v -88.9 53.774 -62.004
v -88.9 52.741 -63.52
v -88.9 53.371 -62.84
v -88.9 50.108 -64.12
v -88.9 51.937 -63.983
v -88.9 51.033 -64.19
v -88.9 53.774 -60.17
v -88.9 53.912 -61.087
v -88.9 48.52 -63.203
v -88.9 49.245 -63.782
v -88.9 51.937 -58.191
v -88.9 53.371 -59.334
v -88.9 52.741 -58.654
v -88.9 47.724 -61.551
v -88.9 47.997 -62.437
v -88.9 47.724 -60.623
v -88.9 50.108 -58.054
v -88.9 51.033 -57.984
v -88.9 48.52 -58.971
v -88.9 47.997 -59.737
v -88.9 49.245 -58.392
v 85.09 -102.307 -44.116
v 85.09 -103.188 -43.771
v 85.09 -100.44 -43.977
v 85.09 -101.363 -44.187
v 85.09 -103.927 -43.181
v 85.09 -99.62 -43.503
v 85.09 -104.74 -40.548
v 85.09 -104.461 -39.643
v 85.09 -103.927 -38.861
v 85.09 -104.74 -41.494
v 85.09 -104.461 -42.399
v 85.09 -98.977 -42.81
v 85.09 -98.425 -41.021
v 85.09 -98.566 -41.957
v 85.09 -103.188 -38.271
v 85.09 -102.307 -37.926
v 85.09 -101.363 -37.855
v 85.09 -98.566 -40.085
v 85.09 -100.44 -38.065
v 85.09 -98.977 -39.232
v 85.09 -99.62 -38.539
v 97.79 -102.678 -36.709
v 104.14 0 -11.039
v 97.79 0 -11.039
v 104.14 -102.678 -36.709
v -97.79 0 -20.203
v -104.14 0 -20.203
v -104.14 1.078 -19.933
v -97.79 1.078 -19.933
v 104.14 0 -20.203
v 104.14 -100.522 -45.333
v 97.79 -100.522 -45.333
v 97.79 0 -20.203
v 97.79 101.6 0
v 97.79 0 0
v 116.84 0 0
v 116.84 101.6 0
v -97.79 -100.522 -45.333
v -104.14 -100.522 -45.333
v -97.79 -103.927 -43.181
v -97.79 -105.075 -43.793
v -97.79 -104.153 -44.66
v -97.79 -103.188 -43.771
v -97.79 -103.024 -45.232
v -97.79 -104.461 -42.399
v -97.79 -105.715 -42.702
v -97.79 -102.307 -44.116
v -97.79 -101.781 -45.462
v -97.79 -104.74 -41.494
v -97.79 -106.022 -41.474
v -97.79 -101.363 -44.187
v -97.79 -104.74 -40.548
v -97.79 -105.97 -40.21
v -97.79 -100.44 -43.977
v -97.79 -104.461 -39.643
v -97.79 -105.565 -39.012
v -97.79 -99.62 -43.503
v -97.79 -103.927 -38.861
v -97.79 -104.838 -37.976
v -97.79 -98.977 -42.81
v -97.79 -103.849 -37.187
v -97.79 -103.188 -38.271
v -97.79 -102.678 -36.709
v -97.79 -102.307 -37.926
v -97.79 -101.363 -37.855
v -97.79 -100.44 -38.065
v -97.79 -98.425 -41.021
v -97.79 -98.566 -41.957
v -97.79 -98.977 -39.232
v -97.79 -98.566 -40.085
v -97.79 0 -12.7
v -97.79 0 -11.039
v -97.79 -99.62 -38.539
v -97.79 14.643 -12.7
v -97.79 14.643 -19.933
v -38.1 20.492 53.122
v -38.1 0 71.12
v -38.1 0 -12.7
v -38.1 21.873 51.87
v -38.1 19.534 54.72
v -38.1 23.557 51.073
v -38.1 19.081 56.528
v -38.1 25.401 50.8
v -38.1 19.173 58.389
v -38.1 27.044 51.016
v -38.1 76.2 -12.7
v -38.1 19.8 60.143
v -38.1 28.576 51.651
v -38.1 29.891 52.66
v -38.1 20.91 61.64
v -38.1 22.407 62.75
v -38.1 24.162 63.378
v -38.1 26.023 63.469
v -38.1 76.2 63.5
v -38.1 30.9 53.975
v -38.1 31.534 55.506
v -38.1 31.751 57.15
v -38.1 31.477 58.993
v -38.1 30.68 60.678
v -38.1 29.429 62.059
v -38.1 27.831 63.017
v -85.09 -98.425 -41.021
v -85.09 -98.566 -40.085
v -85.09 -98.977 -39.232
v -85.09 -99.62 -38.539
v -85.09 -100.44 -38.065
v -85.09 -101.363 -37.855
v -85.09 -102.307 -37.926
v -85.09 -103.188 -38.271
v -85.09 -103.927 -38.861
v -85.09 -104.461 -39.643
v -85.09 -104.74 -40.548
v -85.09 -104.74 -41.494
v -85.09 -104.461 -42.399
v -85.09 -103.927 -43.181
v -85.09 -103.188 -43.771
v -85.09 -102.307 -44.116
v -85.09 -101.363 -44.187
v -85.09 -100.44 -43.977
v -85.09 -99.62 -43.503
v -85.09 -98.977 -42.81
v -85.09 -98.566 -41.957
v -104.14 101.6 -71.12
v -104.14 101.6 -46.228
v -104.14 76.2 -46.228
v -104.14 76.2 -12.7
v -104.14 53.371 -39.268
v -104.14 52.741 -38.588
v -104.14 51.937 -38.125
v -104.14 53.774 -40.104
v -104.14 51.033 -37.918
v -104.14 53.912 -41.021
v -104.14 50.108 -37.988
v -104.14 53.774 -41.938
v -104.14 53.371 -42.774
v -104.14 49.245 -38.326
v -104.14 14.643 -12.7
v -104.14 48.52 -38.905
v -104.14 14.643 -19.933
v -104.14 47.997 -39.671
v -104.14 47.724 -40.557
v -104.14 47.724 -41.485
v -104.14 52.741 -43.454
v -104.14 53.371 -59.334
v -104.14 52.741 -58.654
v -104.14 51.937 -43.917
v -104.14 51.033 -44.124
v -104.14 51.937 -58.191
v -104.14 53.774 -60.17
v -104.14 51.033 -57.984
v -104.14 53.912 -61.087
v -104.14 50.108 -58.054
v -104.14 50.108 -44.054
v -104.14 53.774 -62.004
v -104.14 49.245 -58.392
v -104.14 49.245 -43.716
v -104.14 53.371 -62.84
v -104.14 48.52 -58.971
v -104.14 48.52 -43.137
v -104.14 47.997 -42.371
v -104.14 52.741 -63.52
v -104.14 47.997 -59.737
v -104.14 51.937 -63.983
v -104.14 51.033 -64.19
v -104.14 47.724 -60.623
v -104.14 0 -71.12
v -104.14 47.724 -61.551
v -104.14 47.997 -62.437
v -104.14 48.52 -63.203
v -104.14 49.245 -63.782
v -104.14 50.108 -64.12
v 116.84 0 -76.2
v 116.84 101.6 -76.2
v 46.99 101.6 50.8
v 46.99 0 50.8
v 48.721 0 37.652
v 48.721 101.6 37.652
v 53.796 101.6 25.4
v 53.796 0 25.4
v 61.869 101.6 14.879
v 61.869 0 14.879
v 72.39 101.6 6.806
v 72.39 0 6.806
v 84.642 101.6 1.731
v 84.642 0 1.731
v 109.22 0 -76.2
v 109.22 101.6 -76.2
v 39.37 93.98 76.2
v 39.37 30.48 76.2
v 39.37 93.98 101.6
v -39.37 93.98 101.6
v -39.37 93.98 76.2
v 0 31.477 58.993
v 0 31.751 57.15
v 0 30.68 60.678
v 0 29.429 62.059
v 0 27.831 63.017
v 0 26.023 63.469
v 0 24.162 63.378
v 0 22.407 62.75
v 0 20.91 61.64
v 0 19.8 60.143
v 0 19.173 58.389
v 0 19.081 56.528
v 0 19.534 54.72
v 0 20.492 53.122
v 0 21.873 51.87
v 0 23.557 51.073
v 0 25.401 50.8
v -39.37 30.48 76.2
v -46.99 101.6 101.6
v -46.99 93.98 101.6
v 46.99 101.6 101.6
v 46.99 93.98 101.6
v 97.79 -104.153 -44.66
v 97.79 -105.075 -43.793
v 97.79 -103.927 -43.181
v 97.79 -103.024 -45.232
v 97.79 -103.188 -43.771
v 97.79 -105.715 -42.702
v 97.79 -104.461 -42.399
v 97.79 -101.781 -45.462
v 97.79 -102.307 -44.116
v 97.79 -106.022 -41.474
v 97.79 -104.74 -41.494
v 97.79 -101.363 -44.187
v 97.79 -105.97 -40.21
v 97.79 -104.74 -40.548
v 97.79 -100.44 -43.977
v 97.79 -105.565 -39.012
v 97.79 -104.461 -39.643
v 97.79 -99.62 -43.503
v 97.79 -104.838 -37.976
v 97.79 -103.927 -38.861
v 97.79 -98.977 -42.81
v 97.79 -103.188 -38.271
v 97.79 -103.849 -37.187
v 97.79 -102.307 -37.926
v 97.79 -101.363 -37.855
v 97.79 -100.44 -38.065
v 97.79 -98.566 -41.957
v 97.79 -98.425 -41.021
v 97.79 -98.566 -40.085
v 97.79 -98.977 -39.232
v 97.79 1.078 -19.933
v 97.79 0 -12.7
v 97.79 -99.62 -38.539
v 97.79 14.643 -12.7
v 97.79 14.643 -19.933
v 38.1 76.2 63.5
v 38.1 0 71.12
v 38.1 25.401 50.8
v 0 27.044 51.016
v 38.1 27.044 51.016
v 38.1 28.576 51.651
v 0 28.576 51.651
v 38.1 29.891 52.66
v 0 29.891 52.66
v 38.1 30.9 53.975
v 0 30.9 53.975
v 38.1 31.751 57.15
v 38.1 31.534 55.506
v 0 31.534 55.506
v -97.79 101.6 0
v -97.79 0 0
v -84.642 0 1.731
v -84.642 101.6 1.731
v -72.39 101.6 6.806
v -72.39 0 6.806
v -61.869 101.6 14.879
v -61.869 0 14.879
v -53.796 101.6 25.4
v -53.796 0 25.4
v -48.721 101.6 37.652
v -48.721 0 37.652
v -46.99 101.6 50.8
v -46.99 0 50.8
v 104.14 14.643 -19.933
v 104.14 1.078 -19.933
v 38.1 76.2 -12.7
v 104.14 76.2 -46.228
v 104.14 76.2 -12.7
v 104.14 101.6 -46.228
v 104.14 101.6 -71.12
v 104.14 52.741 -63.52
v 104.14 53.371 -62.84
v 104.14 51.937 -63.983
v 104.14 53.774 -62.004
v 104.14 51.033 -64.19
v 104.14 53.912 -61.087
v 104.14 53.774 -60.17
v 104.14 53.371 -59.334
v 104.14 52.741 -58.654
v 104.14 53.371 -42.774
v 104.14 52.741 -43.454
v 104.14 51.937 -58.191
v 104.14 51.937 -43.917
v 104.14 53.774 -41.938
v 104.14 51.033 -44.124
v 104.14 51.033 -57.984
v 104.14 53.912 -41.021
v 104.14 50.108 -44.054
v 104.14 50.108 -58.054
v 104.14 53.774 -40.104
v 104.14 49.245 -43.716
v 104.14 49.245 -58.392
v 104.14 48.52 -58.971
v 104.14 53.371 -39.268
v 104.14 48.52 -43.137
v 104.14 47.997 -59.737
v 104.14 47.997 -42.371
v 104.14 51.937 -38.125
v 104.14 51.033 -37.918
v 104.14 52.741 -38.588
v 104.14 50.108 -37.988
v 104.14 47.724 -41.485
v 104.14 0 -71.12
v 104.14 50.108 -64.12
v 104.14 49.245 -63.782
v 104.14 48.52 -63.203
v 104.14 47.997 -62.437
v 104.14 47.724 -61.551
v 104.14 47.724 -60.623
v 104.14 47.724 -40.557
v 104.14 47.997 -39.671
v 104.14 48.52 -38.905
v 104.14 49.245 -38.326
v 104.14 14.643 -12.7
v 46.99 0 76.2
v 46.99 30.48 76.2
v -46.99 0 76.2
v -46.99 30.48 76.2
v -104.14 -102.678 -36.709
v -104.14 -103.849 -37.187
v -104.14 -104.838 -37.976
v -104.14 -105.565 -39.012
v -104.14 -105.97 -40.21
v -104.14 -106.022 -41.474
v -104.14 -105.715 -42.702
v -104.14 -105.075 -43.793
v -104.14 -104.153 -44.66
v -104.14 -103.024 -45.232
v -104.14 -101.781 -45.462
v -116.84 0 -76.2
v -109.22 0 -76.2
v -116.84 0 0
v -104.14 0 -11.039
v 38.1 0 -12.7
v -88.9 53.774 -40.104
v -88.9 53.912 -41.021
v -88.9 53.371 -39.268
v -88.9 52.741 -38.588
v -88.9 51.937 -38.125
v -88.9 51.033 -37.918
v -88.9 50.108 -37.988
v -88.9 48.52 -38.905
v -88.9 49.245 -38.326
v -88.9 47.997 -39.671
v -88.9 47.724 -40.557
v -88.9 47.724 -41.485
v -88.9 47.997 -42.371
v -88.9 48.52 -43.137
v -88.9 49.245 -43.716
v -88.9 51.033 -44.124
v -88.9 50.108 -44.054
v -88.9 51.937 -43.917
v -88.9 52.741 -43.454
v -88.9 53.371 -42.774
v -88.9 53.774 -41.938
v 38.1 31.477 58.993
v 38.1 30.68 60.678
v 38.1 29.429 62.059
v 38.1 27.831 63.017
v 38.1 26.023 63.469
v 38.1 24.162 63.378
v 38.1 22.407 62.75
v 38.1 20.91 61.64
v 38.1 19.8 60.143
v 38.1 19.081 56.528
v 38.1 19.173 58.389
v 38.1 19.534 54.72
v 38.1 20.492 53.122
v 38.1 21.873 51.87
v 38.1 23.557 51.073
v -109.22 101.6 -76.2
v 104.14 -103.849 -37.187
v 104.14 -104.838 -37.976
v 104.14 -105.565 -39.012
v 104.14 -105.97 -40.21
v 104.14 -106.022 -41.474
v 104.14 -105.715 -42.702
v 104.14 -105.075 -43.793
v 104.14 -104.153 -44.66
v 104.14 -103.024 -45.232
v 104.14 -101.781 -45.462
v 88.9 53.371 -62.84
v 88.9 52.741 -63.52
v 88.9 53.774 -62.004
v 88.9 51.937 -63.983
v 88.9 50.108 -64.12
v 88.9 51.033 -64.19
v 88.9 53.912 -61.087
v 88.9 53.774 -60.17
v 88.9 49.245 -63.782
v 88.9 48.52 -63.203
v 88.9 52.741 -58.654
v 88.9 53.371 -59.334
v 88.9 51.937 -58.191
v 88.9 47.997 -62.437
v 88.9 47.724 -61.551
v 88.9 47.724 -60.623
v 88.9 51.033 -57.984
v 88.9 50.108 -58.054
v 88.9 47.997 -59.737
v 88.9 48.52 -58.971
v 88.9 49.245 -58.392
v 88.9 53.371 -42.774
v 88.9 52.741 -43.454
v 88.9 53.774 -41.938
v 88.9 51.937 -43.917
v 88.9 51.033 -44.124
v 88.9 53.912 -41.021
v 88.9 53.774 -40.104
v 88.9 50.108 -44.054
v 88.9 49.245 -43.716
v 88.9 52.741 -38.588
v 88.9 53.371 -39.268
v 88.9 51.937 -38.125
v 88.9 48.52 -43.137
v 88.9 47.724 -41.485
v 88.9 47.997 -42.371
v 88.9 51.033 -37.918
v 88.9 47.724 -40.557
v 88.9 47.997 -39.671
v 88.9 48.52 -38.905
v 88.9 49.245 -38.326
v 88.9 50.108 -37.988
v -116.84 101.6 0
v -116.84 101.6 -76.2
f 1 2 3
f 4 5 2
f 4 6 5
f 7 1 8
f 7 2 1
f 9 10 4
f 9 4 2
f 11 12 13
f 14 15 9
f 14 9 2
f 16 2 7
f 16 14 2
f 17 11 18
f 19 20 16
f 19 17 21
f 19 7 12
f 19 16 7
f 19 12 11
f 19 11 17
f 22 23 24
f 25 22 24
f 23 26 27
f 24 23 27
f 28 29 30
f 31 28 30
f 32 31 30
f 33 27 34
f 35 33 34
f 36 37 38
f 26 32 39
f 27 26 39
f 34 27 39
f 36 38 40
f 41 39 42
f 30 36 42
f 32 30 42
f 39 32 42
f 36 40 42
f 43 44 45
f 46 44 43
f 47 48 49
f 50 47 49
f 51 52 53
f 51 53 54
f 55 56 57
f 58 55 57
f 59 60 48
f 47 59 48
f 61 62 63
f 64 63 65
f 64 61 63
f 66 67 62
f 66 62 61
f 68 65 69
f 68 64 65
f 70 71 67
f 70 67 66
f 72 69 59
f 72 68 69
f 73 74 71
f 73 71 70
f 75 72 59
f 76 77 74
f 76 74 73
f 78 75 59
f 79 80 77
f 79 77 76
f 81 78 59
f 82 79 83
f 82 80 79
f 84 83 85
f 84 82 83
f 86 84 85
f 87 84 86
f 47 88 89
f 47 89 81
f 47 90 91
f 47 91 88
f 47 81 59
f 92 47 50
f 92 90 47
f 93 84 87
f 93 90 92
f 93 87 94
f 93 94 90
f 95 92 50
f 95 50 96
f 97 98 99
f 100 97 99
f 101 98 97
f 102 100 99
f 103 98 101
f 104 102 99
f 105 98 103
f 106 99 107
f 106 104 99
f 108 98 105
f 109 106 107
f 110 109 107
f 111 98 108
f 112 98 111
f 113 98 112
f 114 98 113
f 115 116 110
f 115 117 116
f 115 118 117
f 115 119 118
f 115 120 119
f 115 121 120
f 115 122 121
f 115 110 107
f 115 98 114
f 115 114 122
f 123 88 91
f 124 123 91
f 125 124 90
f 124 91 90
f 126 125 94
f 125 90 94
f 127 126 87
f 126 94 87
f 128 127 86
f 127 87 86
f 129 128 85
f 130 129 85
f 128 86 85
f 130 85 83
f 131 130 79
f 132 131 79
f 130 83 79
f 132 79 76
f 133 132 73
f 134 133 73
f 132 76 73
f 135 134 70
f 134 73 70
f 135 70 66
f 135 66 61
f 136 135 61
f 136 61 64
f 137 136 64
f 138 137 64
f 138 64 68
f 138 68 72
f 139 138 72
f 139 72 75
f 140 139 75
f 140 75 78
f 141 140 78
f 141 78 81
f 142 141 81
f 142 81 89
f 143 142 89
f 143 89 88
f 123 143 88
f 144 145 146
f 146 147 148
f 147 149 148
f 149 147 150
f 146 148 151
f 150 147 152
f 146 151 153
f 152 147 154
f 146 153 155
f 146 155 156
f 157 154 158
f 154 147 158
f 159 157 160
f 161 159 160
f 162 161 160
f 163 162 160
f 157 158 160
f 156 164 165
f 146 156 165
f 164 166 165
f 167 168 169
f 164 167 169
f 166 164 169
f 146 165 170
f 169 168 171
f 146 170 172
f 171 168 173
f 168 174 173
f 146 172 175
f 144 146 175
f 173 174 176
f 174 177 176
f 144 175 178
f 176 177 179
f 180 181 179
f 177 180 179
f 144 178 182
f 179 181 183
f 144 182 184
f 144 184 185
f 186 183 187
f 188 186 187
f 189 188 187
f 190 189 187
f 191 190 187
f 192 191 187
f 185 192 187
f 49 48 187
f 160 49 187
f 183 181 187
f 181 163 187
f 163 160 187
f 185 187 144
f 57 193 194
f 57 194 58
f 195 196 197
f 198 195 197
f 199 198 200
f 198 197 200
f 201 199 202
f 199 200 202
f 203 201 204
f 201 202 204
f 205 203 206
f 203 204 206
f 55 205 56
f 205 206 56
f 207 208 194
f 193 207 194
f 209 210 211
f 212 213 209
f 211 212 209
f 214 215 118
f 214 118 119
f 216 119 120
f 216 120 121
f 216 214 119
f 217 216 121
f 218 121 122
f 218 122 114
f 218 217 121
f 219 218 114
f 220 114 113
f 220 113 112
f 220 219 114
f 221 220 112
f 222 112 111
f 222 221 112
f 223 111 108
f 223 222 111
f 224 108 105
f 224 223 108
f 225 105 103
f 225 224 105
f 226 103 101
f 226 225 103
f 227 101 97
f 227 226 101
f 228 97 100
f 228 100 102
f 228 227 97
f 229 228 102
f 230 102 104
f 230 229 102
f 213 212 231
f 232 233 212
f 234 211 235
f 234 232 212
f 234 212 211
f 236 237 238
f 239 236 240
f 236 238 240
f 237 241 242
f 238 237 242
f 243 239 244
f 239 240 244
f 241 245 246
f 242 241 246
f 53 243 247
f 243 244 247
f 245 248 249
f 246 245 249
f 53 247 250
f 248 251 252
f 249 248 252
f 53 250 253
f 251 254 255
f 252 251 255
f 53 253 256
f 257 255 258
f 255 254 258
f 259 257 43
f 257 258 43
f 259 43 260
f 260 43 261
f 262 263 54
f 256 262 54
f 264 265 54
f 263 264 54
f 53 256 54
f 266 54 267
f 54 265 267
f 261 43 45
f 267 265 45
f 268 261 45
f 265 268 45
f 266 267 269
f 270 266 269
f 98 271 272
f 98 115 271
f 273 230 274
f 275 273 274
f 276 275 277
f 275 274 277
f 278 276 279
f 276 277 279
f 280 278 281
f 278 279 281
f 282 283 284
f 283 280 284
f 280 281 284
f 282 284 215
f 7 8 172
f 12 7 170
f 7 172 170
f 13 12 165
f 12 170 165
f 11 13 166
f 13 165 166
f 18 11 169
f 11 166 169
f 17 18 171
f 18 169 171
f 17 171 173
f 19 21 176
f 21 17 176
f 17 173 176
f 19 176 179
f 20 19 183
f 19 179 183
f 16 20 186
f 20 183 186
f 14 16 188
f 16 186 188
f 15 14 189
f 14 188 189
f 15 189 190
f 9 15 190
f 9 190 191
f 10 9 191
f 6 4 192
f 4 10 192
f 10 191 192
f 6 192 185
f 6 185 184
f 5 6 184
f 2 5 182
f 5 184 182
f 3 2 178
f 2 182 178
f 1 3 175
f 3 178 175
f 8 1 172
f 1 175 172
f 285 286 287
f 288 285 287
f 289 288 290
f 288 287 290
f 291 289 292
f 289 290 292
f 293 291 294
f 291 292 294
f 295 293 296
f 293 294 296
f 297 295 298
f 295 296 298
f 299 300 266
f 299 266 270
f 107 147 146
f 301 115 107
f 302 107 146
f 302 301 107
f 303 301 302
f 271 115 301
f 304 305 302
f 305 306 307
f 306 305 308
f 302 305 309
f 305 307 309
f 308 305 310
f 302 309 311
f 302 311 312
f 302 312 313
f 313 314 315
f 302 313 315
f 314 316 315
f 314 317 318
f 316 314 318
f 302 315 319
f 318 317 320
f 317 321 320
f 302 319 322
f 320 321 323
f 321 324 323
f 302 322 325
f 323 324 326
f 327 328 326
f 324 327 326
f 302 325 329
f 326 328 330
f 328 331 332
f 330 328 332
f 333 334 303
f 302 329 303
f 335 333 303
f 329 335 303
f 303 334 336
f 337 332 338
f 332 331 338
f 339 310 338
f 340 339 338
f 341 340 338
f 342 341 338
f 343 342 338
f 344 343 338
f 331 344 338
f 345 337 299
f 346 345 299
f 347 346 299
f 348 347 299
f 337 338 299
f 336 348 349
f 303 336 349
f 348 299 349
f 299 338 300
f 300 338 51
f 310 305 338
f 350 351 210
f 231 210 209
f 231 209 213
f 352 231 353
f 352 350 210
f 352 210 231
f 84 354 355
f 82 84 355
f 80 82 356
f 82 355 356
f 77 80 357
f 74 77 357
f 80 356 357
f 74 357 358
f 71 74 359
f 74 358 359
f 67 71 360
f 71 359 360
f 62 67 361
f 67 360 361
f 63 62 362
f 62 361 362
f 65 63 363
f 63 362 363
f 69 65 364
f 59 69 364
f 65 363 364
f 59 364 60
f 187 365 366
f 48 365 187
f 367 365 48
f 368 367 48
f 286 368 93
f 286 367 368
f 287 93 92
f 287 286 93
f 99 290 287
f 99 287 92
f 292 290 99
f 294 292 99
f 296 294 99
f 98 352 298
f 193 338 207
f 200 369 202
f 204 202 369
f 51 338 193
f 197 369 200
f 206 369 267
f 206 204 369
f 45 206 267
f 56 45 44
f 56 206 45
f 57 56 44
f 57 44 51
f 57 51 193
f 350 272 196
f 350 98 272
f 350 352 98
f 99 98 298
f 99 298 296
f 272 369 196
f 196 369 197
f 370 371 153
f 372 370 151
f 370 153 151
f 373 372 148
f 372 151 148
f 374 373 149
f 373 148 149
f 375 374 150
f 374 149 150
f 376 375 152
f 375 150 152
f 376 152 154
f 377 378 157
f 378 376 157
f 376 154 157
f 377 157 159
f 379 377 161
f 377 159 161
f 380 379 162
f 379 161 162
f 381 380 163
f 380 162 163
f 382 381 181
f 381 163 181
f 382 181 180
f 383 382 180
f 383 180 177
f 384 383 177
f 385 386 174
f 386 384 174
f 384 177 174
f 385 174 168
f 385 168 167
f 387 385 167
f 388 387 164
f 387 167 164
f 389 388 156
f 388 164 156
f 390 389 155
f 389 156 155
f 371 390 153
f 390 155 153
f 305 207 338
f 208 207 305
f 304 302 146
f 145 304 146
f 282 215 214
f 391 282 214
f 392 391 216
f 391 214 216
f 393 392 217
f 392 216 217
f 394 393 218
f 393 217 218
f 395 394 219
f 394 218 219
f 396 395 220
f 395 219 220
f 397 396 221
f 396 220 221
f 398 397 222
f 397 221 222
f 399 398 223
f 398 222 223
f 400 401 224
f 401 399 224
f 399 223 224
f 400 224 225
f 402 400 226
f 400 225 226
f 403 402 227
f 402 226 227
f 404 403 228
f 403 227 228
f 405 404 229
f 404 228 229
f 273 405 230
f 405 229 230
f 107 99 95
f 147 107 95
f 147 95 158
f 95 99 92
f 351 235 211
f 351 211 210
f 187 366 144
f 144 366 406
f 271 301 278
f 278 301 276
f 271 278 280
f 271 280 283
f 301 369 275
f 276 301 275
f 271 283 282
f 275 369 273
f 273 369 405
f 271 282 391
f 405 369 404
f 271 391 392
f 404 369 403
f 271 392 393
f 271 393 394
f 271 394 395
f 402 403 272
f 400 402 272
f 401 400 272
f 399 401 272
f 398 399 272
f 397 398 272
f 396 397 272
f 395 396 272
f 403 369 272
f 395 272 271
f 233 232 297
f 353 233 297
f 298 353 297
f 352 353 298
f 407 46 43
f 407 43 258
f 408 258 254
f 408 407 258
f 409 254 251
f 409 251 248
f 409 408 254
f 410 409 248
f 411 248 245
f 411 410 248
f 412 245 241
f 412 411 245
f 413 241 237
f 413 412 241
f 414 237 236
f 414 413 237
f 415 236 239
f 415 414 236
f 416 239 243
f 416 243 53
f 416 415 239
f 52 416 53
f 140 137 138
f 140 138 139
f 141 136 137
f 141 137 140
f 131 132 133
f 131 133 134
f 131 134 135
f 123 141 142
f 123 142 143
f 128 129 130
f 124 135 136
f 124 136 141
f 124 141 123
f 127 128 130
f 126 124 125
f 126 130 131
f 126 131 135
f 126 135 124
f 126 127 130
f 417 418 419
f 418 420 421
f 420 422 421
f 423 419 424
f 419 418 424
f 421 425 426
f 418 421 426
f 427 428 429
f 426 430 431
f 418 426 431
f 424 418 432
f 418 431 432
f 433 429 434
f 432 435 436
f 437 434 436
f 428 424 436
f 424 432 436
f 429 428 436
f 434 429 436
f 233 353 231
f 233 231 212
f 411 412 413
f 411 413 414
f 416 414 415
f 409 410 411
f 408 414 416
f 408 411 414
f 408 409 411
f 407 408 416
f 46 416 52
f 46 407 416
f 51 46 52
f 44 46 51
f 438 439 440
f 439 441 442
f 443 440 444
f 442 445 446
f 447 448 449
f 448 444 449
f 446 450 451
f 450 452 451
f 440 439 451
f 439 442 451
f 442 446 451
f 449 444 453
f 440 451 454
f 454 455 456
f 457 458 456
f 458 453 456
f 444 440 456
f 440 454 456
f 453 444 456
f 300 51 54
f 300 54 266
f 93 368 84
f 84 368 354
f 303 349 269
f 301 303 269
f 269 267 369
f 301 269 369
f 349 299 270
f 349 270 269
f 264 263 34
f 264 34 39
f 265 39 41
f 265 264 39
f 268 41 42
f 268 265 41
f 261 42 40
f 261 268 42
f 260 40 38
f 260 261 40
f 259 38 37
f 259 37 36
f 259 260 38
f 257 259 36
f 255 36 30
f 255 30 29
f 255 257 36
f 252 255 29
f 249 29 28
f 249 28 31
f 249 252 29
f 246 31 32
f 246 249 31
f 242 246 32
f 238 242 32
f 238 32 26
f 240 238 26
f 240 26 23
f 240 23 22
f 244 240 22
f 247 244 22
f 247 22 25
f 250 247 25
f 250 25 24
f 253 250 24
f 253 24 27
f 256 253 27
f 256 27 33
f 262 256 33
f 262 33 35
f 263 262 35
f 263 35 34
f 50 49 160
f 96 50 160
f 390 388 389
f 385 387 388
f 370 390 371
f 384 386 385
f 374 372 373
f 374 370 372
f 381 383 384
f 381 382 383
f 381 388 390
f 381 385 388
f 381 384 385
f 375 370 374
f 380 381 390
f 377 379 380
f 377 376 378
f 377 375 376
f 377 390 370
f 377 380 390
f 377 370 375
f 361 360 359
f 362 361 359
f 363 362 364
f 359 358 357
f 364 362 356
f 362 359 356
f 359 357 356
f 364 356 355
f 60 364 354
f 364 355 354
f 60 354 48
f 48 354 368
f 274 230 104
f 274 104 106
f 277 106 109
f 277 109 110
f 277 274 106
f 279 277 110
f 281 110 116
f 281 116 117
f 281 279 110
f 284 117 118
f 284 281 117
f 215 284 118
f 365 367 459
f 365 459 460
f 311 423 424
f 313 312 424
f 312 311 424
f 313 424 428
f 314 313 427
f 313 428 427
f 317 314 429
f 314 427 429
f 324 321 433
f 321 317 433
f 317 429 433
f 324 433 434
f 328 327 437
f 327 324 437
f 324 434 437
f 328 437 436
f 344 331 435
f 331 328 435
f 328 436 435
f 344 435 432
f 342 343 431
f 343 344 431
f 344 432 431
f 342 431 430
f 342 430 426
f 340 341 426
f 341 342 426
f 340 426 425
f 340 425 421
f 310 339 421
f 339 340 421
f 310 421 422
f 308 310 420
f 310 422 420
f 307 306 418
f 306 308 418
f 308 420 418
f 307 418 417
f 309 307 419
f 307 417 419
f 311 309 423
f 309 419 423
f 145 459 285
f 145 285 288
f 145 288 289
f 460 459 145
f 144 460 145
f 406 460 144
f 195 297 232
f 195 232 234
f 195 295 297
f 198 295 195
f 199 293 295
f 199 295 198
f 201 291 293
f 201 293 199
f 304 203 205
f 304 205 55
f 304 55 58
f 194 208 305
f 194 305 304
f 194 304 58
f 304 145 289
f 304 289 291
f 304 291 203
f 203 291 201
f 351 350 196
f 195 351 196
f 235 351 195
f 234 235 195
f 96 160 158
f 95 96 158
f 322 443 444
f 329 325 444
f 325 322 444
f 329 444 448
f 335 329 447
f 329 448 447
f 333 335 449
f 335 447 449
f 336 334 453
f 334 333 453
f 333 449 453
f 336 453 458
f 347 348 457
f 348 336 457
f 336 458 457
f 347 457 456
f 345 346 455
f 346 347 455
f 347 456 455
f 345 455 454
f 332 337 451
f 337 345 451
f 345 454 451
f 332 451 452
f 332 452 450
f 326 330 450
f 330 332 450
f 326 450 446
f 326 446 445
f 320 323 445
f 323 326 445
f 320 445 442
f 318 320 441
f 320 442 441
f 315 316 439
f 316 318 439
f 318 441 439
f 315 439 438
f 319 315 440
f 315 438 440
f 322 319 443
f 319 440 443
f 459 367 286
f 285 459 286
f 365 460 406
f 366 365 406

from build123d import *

# Parameters (mm, degrees)
F0_W          = 116.84
F0_H          = 76.2
F1_DEPTH      = 101.6
F3_DEPTH      = 76.2
F5_DEPTH      = 38.1
F5_DEPTH_BACK = 38.1
F6_R          = 3.1115
F7_DEPTH      = 114.3
F7_DEPTH_BACK = 114.3
F9_DEPTH      = 101.601
F11_DEPTH     = 25.401
F12_SIZE      = 5.08
F13_W         = 177.8
F13_H         = 62.1990481529
F14_DEPTH     = 76.2
F15_W         = 93.98
F15_H         = 7.62
F16_DEPTH     = 25.4
F18_DEPTH     = 7.62
F20_DEPTH     = 7.62
F21_R         = 3.175
F22_DEPTH     = 6.35
F23_DEPTH     = 19.05


with BuildPart() as f1:
    # F0 (on Front) → F1 (new body)
    with BuildSketch(Plane.XZ):
        with Locations((58.42, 38.1)):
            Rectangle(F0_W, F0_H)
        with Locations((-58.42, 38.1)):
            Rectangle(F0_W, F0_H)
        with Locations((58.42, -38.1)):
            Rectangle(F0_W, F0_H)
        with Locations((-58.42, -38.1)):
            Rectangle(F0_W, F0_H)
    extrude(amount=-F1_DEPTH)

    # F2 (on face) → F3 (cut)
    with BuildSketch(Plane.XZ):
        Polygon((-38.1, -12.7), (-104.14, -12.7), (-104.14, -69.85), (-104.14, -76.2), (104.14, -76.2), (104.14, -69.85), (104.14, -12.7), (38.1, -12.7), (38.1, 63.5), (-38.1, 63.5), align=None)
    extrude(amount=-F3_DEPTH, mode=Mode.SUBTRACT)

    # F4 (on Right) → F5 (cut, two sides)
    with BuildSketch(Plane.YZ) as f5_sk:
        Polygon((0, 71.12), (0, 63.5), (76.2, 63.5), align=None)
    extrude(amount=-F5_DEPTH, mode=Mode.SUBTRACT)
    extrude(f5_sk.sketch, amount=F5_DEPTH_BACK, mode=Mode.SUBTRACT)

    # F6 (on Right) → F7 (join, two sides)
    with BuildSketch(Plane.YZ) as f7_sk:
        with BuildLine():
            ThreePointArc((25.4005372305, 50.8), (29.8906652911, 52.6598719395), (31.7505372305, 57.15))
            ThreePointArc((31.7505372305, 57.15), (20.91040917, 61.6401280605), (25.4005372305, 50.8))
        make_face()
        with Locations((50.8005372305, -41.021)):
            Circle(F6_R)
        with Locations((50.8005372305, -61.087)):
            Circle(F6_R)
    extrude(amount=F7_DEPTH)
    extrude(f7_sk.sketch, amount=-F7_DEPTH_BACK)

    # F8 (on face) → F9 (cut, through all)
    with BuildSketch(Plane.XZ):
        with BuildLine():
            Line((-46.99, 76.2), (-116.84, 76.2))
            Line((-116.84, 76.2), (-116.84, 0))
            Line((-116.84, 0), (-97.79, 0))
            ThreePointArc((-97.79, 0), (-61.8689755157, 14.8789755157), (-46.99, 50.8))
            Line((-46.99, 50.8), (-46.99, 76.2))
        make_face()
        with BuildLine():
            Line((116.84, 0), (116.84, 76.2))
            Line((116.84, 76.2), (46.99, 76.2))
            Line((46.99, 76.2), (46.99, 50.8))
            ThreePointArc((46.99, 50.8), (61.8689755157, 14.8789755157), (97.79, 0))
            Line((97.79, 0), (116.84, 0))
        make_face()
    extrude(amount=-F9_DEPTH, mode=Mode.SUBTRACT)

    # F10 (on face) → F11 (cut, through all)
    with BuildSketch(Plane.XZ.offset(-76.2)):
        Polygon((104.14, -76.2), (104.14, -48.7679988146), (104.14, -46.2279988146), (-104.14, -46.2279988146), (-104.14, -48.7679988146), (-104.14, -76.2), align=None)
    extrude(amount=-F11_DEPTH, mode=Mode.SUBTRACT)

    # F12
    f12_edges = [f1.edges().sort_by_distance(p)[0] for p in [
        (104.14, 50.8, -76.2),
        (-104.14, 50.8, -76.2),
    ]]
    chamfer(f12_edges, length=F12_SIZE)

    # F13 (on Front) → F14 (cut)
    with BuildSketch(Plane.XZ):
        with Locations((0, -55.8045858206)):
            Rectangle(F13_W, F13_H)
    extrude(amount=-F14_DEPTH, mode=Mode.SUBTRACT)

    # F15 (on face) → F16 (join)
    with BuildSketch(Plane.XY.offset(76.2)):
        with Locations((0, 97.79)):
            Rectangle(F15_W, F15_H)
    extrude(amount=F16_DEPTH)

    # F17 (on face) → F18 (join)
    with BuildSketch(Plane.YZ.offset(46.99)):
        Polygon((93.98, 76.2), (93.98, 101.6), (30.48, 76.2), align=None)
    extrude(amount=-F18_DEPTH)

    # F19 (on face) → F20 (join)
    with BuildSketch(Plane(origin=(-46.99, 0, 0), x_dir=(0, -1, 0), z_dir=(-1, 0, 0))):
        Polygon((-30.48, 76.2), (-93.98, 101.6), (-93.98, 76.2), align=None)
    extrude(amount=-F20_DEPTH)

    # F21 (on face) → F22 (join)
    with BuildSketch(Plane.YZ.offset(-104.14)):
        with BuildLine():
            Line((6.0337829095, -9.5307531462), (-1.0780708533, -11.3087165869))
            Line((-1.0780708533, -11.3087165869), (-102.6780708533, -36.7087165869))
            ThreePointArc((-102.6780708533, -36.7087165869), (-105.9122834131, -42.0990708533), (-100.5219291467, -45.3332834131))
            Line((-100.5219291467, -45.3332834131), (0, -20.2028011265))
            Line((0, -20.2028011265), (1.0780708533, -19.9332834131))
            Line((1.0780708533, -19.9332834131), (14.6432286128, -19.9332834131))
            Line((14.6432286128, -19.9332834131), (14.6432286128, -9.5307531462))
            Line((14.6432286128, -9.5307531462), (6.0337829095, -9.5307531462))
        make_face()
        with Locations((-101.6, -41.021)):
            Circle(F21_R, mode=Mode.SUBTRACT)
        with Locations((-101.6, -41.021)):
            Circle(F21_R)
    extrude(amount=F22_DEPTH)

    # F21 (on face) → F23 (join)
    with BuildSketch(Plane.YZ.offset(-104.14)):
        with Locations((-101.6, -41.021)):
            Circle(F21_R)
    extrude(amount=F23_DEPTH)

    # F24: F1 across plane


with BuildPart() as f1_1:
    add(f1.part)
    add(f1.part.mirror(Plane.YZ))


solid = f1_1.part
